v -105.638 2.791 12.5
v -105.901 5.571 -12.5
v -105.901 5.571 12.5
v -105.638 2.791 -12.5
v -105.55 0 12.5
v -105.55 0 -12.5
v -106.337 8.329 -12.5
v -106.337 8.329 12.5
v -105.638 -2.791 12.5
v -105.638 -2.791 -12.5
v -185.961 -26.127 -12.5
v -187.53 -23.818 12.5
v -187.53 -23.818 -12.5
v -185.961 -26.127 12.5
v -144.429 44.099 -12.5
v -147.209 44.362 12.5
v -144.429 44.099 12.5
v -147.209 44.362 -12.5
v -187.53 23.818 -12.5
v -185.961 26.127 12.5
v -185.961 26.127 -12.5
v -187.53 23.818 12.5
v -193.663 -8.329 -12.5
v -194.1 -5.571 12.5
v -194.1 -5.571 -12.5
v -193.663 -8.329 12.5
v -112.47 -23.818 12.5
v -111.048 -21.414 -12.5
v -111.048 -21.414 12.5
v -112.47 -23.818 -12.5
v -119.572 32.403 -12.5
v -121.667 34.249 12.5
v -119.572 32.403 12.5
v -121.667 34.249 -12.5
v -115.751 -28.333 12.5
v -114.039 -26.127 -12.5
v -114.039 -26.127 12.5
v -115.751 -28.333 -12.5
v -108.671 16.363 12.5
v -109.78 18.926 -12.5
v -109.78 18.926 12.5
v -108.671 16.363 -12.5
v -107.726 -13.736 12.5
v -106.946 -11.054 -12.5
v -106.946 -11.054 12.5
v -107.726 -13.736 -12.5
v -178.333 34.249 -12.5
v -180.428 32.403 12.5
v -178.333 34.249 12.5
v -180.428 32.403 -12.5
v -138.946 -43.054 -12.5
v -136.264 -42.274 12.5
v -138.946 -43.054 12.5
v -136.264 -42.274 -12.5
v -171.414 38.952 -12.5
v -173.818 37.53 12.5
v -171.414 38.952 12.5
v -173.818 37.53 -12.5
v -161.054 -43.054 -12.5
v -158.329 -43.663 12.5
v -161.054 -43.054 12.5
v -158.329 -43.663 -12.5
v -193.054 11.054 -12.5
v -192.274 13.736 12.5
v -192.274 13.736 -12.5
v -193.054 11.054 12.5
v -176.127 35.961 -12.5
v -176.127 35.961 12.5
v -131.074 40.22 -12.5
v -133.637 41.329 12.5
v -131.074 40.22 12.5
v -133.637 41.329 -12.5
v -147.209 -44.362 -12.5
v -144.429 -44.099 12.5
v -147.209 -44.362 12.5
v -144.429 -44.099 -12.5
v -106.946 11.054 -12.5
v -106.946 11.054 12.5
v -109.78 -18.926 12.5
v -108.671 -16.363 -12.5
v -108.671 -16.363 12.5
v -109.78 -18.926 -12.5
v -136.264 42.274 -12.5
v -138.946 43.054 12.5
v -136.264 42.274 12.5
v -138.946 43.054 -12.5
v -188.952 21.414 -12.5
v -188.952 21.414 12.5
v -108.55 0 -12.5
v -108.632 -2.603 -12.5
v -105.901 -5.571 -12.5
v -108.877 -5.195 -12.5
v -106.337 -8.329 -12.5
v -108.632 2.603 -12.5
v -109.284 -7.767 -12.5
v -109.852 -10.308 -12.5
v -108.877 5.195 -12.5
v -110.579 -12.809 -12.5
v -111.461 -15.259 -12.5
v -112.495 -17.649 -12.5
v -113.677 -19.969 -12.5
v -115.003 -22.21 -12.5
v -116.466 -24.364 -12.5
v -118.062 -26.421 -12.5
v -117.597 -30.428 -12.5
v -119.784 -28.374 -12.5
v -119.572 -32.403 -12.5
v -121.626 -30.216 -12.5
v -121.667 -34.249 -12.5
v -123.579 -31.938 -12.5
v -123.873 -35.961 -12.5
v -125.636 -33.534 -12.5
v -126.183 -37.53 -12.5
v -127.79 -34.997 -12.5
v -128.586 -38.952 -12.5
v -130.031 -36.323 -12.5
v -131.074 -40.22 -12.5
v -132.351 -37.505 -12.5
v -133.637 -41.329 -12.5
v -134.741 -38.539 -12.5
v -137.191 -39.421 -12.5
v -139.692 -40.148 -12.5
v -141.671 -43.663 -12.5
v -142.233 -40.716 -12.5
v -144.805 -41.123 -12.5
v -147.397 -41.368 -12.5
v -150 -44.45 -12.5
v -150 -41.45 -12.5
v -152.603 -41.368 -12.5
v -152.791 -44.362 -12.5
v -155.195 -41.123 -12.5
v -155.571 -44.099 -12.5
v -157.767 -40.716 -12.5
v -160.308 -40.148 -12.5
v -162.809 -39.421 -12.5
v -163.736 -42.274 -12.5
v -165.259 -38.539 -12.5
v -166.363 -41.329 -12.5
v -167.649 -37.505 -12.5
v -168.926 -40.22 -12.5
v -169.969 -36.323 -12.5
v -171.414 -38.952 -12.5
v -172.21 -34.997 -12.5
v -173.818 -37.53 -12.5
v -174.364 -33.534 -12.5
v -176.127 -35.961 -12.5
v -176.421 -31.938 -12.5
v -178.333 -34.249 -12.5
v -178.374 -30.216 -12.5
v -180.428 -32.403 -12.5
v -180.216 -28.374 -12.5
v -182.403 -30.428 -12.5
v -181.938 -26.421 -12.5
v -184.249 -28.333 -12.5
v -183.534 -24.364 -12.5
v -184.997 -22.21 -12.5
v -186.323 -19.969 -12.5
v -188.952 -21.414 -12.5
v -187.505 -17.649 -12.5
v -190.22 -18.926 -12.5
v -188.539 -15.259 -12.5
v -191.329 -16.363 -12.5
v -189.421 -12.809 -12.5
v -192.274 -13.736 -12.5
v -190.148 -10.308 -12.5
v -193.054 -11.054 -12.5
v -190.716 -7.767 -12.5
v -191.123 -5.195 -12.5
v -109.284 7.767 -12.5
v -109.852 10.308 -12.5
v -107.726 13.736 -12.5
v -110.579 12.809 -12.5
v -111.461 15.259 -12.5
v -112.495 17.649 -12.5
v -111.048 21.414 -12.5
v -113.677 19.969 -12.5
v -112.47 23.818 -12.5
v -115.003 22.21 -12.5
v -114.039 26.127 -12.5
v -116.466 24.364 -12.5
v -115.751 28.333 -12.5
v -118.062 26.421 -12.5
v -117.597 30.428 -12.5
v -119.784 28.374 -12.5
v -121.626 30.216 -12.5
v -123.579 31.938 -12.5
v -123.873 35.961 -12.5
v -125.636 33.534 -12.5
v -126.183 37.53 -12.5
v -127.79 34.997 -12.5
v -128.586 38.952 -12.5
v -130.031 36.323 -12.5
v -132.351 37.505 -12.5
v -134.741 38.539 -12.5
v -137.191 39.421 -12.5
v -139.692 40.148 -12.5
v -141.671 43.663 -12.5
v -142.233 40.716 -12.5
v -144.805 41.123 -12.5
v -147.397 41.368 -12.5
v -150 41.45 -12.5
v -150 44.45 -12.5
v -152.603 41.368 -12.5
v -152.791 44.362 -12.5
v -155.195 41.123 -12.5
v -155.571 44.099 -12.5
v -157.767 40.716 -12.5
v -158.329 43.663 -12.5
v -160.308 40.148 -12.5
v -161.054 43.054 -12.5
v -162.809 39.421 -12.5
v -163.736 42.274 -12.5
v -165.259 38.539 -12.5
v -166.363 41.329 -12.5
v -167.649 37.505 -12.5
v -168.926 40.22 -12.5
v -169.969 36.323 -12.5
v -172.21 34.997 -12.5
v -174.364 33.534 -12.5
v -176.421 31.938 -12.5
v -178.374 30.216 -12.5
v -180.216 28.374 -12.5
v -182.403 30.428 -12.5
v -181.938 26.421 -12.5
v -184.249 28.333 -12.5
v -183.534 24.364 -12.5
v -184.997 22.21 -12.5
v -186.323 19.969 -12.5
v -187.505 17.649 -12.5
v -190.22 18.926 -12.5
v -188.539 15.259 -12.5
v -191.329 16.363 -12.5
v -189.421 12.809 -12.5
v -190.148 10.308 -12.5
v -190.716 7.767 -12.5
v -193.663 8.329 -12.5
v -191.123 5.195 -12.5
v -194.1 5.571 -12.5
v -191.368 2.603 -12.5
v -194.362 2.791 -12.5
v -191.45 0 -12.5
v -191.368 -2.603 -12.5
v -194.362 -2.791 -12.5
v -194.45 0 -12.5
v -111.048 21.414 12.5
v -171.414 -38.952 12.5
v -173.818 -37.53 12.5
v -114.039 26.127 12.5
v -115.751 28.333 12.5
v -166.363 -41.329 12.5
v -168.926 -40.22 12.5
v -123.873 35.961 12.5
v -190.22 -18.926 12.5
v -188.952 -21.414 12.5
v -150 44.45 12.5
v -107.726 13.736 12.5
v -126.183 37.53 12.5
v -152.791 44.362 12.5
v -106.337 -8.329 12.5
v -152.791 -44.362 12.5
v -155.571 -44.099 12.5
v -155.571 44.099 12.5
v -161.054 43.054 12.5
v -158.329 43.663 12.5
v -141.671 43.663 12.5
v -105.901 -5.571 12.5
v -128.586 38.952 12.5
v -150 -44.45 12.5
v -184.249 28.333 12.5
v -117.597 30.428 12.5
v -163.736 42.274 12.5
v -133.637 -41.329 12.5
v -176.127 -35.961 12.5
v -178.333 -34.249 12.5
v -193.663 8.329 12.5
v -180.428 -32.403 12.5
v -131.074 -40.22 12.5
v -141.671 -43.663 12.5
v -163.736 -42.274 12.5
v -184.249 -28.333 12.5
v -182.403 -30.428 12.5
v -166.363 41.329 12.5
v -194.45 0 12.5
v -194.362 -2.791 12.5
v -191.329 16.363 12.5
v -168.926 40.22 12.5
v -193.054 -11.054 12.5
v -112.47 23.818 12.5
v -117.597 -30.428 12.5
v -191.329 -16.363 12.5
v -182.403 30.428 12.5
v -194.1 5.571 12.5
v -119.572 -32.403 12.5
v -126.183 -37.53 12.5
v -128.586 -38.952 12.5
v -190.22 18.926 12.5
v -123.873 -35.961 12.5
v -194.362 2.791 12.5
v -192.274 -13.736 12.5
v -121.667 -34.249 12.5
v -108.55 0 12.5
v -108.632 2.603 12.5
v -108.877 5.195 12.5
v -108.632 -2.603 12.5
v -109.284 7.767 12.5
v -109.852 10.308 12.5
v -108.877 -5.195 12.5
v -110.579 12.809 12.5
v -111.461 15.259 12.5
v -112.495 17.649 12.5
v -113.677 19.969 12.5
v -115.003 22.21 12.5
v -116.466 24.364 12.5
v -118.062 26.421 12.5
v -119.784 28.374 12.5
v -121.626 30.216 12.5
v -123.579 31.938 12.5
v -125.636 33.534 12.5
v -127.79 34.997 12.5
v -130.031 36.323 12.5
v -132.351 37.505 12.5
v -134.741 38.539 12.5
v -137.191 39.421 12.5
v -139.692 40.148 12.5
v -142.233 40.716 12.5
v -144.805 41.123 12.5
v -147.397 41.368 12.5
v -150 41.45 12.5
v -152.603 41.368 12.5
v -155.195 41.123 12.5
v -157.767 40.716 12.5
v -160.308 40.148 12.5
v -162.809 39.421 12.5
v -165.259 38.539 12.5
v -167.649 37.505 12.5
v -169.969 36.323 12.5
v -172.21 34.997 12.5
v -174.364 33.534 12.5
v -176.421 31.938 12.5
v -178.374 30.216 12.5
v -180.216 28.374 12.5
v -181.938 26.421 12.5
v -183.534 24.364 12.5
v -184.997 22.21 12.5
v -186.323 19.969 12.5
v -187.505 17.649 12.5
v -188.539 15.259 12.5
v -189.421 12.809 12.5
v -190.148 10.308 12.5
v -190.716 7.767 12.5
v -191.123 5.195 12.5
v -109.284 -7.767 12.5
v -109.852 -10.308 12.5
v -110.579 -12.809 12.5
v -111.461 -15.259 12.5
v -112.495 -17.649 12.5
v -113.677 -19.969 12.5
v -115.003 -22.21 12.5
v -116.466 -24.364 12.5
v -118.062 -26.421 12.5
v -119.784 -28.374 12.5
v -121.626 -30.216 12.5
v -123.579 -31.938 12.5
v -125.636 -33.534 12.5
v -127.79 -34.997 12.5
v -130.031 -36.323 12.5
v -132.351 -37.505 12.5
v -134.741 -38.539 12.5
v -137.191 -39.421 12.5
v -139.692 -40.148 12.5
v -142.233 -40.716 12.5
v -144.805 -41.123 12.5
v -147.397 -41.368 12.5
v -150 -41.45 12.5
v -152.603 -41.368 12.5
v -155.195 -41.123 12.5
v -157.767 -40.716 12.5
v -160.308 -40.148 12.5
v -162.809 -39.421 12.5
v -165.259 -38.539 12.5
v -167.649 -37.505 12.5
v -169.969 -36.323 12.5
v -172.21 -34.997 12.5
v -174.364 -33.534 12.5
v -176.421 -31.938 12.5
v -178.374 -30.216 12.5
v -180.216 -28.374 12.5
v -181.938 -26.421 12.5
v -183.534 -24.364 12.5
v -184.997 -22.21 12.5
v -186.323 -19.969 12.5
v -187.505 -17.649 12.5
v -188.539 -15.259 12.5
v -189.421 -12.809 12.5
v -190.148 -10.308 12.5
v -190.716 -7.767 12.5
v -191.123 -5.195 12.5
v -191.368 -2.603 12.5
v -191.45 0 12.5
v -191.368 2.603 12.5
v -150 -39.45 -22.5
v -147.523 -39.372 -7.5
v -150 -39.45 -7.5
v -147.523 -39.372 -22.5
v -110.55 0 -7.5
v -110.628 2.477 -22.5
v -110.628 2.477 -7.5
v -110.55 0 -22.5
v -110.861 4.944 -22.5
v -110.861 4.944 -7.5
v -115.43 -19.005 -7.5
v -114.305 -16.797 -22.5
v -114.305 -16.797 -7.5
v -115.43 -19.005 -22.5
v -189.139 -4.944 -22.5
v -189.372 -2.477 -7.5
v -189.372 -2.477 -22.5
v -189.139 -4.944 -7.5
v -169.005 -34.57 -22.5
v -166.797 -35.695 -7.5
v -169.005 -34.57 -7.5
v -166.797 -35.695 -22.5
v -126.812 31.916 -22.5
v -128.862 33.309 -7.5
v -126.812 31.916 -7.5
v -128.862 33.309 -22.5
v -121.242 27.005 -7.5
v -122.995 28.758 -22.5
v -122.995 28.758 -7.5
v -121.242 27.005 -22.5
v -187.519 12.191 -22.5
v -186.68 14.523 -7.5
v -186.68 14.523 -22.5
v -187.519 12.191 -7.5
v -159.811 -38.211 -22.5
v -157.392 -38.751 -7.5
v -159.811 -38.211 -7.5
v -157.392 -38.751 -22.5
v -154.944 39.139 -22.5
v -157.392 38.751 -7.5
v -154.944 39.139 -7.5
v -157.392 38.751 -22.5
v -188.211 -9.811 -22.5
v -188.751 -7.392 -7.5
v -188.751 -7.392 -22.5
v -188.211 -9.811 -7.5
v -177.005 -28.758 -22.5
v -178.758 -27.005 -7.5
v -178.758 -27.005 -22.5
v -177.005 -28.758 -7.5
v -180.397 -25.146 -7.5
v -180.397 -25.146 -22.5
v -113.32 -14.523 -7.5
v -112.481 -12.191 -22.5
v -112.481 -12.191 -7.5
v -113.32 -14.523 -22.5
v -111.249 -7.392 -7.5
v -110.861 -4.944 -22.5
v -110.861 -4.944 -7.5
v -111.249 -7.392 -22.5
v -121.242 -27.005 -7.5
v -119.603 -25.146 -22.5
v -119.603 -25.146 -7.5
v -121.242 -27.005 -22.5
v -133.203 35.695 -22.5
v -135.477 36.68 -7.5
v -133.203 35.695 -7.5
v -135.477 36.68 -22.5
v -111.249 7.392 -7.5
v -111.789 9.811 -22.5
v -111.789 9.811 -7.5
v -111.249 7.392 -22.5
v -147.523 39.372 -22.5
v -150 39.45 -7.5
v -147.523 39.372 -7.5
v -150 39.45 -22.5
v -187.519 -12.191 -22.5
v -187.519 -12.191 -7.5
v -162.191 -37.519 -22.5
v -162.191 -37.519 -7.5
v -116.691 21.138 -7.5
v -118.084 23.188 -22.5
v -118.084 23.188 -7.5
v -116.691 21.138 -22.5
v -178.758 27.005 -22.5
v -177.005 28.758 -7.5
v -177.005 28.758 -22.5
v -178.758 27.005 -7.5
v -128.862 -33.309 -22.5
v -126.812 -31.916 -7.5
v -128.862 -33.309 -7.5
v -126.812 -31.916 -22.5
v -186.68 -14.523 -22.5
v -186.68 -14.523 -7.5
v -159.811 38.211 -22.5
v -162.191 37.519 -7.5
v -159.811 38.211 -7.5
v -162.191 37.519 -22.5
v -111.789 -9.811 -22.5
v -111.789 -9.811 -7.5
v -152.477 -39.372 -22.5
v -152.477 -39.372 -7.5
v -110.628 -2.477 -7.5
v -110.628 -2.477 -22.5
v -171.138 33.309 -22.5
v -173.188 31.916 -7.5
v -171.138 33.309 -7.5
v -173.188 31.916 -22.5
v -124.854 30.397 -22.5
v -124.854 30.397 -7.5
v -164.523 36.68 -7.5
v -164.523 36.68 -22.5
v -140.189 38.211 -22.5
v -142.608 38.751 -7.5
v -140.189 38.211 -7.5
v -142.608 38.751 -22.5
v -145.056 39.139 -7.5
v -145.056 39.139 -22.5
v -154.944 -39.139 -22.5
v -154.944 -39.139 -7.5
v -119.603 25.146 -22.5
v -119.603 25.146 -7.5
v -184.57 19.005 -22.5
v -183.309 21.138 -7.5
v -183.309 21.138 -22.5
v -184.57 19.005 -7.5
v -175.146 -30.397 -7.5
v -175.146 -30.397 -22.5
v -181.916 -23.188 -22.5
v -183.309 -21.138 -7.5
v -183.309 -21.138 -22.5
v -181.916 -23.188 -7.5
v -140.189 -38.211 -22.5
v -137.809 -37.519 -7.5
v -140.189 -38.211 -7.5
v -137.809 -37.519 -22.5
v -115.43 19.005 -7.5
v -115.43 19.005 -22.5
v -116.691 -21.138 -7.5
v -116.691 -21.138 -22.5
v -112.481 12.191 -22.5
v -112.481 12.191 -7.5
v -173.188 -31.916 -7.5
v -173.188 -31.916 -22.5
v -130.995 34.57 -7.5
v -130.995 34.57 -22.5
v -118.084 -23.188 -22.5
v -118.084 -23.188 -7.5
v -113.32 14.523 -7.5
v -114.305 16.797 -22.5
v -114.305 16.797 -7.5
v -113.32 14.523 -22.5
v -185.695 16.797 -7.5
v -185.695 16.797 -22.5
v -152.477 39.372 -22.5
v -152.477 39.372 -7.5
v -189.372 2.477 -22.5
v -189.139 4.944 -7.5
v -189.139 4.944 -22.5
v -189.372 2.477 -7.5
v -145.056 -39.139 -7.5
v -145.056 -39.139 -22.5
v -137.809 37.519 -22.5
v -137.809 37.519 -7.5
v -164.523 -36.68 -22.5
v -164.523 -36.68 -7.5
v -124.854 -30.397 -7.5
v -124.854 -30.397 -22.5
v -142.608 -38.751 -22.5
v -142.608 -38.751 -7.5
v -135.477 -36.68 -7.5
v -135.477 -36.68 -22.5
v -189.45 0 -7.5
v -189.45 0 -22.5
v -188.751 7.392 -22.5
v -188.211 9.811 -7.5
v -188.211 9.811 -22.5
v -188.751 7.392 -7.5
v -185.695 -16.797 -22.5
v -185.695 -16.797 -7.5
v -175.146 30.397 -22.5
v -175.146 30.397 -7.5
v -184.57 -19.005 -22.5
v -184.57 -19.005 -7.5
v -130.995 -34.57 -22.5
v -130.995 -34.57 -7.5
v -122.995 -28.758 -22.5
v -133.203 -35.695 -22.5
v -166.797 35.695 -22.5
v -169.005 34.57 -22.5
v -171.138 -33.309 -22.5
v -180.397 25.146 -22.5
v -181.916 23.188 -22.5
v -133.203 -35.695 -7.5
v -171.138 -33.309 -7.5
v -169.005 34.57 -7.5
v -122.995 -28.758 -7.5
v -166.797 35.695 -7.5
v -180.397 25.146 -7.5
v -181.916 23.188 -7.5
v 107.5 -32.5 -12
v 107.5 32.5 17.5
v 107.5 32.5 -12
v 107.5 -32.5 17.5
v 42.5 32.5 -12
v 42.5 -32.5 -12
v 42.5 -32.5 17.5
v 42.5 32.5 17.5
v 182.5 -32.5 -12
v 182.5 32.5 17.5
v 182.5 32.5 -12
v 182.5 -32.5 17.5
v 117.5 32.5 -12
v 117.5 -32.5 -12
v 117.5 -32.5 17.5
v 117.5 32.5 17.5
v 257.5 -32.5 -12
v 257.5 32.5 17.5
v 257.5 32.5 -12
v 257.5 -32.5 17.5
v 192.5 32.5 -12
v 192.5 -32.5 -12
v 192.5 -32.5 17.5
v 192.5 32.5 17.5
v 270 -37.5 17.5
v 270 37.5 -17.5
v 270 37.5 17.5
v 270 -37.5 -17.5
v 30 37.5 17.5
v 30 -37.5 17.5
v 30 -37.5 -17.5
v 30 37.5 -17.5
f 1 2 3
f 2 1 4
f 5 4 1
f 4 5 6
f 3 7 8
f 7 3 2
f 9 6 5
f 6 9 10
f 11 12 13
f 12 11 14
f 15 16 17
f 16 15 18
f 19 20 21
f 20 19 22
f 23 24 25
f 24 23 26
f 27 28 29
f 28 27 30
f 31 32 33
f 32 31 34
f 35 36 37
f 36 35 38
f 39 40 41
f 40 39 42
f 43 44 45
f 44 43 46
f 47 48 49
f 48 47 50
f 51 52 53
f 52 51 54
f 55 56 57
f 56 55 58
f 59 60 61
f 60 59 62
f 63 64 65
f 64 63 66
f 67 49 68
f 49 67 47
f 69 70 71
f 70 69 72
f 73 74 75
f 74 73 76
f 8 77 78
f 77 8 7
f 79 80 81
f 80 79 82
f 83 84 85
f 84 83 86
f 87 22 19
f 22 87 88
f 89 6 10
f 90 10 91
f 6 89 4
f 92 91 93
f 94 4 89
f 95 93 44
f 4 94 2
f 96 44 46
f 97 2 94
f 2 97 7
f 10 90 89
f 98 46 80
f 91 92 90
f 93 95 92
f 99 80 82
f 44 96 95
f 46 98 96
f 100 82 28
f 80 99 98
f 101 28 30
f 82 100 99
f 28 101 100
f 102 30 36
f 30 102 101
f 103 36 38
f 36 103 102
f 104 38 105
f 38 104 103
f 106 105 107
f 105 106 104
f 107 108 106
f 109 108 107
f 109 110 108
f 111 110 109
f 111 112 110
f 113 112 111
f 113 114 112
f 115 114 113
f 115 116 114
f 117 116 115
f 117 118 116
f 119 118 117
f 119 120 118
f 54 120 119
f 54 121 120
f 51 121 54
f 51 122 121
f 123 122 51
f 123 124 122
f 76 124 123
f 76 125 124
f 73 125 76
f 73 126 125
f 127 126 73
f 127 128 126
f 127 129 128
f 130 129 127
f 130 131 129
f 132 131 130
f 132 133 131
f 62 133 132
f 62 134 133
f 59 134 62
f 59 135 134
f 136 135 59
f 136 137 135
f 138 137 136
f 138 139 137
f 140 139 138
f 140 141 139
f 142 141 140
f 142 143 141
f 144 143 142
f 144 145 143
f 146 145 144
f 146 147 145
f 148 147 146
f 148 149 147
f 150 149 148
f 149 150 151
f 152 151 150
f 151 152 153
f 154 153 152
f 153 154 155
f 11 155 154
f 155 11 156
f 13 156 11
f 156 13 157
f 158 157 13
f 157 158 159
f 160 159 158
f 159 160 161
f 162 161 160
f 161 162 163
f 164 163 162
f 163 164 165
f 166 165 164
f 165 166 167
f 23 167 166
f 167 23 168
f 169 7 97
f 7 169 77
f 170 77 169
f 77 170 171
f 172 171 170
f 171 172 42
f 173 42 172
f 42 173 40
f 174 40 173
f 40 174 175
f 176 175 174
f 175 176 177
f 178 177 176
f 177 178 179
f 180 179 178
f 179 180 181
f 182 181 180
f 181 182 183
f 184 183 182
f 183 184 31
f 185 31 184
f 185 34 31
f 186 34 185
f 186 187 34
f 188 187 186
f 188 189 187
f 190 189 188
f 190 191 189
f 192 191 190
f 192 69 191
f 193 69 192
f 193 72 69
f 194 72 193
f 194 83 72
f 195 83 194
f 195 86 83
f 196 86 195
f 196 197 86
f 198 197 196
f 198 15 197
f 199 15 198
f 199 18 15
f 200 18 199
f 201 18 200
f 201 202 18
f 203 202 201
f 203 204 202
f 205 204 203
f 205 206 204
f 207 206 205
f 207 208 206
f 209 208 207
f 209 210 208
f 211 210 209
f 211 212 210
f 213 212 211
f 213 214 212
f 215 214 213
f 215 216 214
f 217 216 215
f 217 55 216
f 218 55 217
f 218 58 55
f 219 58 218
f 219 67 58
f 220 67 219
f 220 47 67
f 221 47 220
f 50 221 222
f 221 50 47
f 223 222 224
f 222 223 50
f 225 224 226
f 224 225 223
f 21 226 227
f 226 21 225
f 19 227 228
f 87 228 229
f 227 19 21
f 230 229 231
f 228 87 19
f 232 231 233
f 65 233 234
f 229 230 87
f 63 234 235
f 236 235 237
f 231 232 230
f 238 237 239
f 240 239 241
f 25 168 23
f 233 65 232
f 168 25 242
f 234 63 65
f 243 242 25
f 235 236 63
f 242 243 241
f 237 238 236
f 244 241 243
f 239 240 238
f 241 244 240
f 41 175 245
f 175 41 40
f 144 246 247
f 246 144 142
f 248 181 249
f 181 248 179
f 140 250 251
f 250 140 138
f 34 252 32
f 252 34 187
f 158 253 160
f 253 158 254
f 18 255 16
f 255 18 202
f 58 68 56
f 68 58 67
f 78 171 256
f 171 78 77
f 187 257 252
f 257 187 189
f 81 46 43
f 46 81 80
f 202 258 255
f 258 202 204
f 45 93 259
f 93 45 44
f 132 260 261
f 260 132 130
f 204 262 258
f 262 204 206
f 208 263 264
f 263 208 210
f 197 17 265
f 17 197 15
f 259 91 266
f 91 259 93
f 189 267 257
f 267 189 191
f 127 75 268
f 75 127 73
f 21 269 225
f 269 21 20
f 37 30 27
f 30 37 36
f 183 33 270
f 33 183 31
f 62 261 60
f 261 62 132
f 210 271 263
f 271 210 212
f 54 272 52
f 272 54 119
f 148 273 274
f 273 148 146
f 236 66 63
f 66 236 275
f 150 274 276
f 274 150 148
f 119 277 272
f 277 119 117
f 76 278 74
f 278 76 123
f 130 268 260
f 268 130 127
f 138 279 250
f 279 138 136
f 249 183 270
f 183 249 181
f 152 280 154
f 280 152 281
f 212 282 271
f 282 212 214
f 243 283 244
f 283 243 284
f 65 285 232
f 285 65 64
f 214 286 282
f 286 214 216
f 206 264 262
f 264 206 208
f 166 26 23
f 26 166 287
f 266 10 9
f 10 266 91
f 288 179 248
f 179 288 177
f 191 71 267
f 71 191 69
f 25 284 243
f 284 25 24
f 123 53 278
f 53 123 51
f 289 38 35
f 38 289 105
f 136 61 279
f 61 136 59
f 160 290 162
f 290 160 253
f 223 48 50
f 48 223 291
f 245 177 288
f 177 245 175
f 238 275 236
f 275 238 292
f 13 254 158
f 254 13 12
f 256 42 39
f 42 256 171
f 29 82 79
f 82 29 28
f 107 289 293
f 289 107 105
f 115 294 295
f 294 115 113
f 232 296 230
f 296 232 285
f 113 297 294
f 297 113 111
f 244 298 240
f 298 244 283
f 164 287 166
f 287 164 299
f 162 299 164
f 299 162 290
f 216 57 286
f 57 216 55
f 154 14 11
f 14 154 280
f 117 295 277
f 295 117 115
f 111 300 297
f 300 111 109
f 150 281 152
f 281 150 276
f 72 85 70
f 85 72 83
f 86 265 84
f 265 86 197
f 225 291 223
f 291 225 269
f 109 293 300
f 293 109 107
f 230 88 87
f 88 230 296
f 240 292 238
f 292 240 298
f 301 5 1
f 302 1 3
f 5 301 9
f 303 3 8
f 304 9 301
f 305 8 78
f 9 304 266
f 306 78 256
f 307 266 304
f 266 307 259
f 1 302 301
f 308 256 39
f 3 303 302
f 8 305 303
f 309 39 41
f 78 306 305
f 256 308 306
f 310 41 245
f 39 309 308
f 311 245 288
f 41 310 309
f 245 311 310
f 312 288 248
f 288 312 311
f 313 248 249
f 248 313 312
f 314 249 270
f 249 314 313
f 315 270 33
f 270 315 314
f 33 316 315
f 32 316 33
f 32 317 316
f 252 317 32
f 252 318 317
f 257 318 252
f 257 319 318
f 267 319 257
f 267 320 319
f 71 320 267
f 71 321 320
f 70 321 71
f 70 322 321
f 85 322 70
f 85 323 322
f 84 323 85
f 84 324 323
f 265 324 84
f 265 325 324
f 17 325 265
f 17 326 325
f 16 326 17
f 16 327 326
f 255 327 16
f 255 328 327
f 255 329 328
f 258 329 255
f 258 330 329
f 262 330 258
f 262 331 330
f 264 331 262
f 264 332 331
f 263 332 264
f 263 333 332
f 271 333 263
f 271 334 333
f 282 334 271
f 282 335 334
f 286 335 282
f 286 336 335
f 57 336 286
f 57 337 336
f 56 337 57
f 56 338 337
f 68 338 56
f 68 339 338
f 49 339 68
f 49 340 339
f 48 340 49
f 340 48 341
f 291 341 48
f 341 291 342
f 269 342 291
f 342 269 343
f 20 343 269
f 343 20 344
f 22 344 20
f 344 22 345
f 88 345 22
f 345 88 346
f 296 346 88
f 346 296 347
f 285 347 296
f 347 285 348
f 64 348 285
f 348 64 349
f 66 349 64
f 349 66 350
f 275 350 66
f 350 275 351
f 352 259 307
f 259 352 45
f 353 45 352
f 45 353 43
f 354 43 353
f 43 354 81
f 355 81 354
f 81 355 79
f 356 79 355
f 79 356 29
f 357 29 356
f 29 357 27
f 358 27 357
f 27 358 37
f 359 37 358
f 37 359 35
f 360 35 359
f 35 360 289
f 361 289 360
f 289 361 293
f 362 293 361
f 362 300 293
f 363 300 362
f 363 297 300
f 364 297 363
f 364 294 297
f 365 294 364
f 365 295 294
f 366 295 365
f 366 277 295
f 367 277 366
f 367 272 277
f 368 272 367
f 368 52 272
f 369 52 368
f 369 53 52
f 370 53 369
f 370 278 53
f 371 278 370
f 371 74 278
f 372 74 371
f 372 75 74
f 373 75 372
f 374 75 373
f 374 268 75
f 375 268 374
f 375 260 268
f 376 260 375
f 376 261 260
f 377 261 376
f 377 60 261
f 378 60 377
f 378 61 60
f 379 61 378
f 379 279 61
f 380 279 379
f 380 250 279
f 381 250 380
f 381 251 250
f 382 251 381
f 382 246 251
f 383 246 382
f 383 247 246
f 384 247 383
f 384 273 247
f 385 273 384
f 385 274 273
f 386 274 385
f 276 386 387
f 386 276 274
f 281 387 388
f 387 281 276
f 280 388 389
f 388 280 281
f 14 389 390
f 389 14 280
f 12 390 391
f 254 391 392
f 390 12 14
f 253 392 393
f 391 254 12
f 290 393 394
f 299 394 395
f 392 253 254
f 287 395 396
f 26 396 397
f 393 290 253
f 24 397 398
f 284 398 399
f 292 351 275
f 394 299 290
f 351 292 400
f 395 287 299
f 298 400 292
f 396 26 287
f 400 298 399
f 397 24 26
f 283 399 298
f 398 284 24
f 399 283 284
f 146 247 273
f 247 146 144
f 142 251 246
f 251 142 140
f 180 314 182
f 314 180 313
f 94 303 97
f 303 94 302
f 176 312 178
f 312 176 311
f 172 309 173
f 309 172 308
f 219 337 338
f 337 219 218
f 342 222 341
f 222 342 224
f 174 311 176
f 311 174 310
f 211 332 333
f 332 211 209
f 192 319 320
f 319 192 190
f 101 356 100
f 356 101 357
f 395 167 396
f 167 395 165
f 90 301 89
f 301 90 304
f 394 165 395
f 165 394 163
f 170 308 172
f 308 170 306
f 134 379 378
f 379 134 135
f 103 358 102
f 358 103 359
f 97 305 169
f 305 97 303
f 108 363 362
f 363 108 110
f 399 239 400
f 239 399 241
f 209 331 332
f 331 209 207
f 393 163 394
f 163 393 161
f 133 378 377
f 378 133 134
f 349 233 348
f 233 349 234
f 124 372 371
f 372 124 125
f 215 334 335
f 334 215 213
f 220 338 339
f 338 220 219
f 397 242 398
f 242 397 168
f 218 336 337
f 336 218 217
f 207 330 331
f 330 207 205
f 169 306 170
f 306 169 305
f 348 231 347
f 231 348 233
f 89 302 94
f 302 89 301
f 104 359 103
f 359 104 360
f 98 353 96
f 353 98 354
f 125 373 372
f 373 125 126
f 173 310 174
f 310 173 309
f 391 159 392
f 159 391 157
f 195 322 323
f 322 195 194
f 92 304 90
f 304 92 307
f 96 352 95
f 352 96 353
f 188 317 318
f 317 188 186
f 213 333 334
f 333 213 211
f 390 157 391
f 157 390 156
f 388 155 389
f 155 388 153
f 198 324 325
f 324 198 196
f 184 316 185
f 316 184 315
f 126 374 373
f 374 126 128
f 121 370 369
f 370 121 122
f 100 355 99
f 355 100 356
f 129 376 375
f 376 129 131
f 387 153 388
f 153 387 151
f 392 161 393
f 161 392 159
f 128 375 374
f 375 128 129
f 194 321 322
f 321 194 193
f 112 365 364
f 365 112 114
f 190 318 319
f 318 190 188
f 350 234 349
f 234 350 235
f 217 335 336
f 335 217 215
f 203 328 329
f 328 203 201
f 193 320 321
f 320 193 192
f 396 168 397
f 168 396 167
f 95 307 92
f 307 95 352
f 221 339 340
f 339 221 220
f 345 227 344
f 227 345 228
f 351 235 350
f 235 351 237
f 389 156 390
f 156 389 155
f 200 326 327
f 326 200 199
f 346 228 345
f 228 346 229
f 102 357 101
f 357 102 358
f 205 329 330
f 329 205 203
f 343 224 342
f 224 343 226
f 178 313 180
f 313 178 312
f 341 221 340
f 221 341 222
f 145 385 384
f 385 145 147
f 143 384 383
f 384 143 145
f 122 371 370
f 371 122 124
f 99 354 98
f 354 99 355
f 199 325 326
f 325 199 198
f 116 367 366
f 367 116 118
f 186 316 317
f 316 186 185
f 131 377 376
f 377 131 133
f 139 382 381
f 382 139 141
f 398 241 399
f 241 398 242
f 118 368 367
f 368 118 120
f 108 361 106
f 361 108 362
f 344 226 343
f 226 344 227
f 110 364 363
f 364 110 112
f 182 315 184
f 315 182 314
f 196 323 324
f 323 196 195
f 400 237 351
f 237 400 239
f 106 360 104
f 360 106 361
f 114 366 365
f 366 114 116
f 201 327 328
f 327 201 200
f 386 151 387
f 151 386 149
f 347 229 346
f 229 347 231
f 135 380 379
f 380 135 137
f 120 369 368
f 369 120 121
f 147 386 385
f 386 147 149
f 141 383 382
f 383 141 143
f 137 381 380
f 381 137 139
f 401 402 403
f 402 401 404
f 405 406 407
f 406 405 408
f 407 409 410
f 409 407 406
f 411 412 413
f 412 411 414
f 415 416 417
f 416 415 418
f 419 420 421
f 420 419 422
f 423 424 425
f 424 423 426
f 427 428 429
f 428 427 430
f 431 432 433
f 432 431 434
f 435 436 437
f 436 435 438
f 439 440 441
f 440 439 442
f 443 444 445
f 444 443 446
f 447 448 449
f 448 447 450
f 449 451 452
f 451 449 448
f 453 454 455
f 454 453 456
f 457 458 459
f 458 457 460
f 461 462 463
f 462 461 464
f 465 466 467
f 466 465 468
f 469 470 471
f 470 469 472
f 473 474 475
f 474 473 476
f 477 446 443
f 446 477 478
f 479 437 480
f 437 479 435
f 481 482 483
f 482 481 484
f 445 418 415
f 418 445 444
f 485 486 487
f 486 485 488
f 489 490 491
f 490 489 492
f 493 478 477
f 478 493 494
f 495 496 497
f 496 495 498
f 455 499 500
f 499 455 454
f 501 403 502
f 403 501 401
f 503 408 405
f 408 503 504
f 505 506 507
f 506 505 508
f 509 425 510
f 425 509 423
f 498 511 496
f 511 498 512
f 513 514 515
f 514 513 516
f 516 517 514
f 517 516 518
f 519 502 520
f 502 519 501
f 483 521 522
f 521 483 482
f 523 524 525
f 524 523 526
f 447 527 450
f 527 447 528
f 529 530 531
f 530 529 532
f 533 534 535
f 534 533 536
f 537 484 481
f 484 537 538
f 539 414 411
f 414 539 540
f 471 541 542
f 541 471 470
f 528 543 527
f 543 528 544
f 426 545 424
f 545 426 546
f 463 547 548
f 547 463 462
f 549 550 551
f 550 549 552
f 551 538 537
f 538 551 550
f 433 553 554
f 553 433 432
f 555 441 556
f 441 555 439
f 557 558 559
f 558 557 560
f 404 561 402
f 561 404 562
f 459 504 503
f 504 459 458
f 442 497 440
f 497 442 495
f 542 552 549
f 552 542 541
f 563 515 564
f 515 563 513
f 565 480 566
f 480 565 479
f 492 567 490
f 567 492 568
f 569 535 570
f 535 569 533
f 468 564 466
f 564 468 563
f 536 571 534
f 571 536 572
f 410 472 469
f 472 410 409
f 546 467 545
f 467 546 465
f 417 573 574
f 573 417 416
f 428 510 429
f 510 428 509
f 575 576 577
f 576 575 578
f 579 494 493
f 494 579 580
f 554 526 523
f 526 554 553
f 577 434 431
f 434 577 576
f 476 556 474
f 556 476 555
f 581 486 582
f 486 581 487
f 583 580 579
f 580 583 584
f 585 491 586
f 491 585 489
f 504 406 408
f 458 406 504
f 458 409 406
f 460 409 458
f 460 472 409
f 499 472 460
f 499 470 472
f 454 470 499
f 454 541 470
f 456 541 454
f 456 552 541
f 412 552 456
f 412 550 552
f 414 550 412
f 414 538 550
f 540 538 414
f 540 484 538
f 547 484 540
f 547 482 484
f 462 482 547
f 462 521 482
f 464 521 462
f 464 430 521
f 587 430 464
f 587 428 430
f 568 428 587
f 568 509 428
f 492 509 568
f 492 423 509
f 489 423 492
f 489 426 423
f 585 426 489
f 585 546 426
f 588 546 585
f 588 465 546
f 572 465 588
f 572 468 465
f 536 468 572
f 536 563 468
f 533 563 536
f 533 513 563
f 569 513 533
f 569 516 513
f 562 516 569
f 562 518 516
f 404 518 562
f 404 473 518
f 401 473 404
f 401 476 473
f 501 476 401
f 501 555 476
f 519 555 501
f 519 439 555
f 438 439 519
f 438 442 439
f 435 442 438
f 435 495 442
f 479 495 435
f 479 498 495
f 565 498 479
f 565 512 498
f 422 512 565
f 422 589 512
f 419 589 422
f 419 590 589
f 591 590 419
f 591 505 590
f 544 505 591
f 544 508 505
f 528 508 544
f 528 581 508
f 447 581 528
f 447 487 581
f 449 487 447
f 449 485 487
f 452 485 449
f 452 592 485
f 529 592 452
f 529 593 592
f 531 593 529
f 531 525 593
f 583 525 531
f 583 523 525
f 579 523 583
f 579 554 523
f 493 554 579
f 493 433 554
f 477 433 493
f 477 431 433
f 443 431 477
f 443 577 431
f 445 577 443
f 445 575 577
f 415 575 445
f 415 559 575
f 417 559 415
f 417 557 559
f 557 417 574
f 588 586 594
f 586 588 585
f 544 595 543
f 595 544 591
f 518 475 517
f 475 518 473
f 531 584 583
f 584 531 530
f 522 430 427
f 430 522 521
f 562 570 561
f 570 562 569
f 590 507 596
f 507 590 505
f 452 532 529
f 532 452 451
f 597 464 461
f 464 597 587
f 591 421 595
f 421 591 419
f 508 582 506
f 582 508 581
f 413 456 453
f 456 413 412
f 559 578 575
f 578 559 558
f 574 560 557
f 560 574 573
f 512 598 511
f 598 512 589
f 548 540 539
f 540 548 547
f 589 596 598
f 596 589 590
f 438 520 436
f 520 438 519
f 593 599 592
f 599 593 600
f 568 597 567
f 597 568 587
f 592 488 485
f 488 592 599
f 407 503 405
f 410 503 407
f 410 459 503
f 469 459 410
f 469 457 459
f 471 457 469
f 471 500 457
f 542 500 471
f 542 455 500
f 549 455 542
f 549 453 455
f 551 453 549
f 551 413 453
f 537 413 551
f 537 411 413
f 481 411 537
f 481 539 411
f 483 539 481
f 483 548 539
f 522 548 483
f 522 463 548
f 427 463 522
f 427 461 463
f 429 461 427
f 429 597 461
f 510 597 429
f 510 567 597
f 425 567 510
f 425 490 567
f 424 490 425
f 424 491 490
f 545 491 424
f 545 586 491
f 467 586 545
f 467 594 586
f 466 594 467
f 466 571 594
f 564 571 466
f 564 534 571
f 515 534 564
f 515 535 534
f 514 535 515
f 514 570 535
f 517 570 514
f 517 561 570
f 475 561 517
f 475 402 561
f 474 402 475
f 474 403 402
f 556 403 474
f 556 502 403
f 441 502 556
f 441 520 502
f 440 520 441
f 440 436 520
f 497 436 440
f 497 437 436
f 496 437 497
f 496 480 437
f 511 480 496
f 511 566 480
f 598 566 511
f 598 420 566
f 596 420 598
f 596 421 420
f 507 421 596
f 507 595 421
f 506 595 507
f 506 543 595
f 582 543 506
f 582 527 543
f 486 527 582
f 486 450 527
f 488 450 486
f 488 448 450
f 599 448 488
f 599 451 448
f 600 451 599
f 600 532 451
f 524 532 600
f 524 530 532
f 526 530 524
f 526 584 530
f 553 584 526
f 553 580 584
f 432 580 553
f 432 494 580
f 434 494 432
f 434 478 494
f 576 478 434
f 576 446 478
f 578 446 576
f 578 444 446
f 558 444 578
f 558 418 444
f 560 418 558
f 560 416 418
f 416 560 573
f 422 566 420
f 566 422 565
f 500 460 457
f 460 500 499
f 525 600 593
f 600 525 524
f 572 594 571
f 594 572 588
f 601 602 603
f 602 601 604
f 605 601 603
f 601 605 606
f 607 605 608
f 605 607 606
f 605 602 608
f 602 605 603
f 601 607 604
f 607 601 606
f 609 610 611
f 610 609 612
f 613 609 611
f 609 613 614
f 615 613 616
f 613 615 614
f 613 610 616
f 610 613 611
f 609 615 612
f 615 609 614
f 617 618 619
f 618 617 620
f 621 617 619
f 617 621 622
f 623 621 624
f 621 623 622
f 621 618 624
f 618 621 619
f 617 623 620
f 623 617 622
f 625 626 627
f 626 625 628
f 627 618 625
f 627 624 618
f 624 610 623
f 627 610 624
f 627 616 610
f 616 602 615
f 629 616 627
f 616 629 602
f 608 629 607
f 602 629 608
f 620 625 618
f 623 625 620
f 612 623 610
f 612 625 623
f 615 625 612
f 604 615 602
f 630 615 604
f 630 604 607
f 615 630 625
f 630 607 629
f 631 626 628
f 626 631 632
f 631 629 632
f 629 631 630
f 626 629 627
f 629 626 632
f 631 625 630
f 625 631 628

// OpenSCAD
// ====================================================================================
// REVOLUTIONARY TECHNOLOGY COMPANY & UNIVERSITY OF WASHINGTON DEPARTMENT OF PHYSICS
// Subsystem: copo_street_lighting.scad (Authentic 1969 FMVSS 108 Light Modules)
// Core Application: Dual-Color Front Valance Indicators & 3-Slot Sequential Taillights
// Center Origin (0,0,0) = Geometric Centerpoint of the Front Valance Light Housing Face
// ====================================================================================

$fn = 100; // Injection toolpath surface finish resolution

// --- 1969 Factory Mechanical Dimensions (mm) ---
inch_to_mm         = 25.4;
front_valance_dia  = 3.50 * inch_to_mm;   // Exactly 88.9 mm original front turn signal diameter
rear_lens_width    = 240.00;              // 1969 authentic 3-slot rear housing width
rear_lens_height   = 75.00;
bezel_lip_depth    = 6.00;

module authentic_front_valance_housing() {
    echo("COMPILING 1969 PROFILE FRONT SWITCHBACK TURN SIGNAL BUCKETS");
    color("Amber", 0.5) { // Amber/Clear dual-function indicator visualization plates
        difference() {
            // Main circular front turn lens cover housing dome
            cylinder(d=front_valance_dia, h=25, center=true);
            cylinder(d=front_valance_dia - 6, h=27, center=true); // Internal cavity fill
        }
    }
    // Rear mounting collar sliding inside the front lower valence sheet metal
    color("DimGrey")
        translate([0, 0, -15])
            cylinder(d=front_valance_dia - 10, h=15, center=true);
}

module authentic_rear_3slot_taillight() {
    echo("COMPILING 1969 SPEC TRIPLE-SLOT REAR TAILLIGHT BACKING FRAMES");
    // Main tail perimeter casting housing
    color("Chrome") {
        difference() {
            cube([rear_lens_width, rear_lens_height, 35], center=true);
            // 3-Slot internal segment separator cavities for sequential LED cards
            for (x_offset = [-75, 0, 75]) {
                translate([x_offset, 0, 4])
                    cube([65, rear_lens_height - 10, 32], center=true);
            }
        }
    }
}

// --- Composite Light Module Compilation ---
union() {
    translate([-150, 0, 0]) authentic_front_valance_housing();
    translate([150, 0, 0])  authentic_rear_3slot_taillight();
}
